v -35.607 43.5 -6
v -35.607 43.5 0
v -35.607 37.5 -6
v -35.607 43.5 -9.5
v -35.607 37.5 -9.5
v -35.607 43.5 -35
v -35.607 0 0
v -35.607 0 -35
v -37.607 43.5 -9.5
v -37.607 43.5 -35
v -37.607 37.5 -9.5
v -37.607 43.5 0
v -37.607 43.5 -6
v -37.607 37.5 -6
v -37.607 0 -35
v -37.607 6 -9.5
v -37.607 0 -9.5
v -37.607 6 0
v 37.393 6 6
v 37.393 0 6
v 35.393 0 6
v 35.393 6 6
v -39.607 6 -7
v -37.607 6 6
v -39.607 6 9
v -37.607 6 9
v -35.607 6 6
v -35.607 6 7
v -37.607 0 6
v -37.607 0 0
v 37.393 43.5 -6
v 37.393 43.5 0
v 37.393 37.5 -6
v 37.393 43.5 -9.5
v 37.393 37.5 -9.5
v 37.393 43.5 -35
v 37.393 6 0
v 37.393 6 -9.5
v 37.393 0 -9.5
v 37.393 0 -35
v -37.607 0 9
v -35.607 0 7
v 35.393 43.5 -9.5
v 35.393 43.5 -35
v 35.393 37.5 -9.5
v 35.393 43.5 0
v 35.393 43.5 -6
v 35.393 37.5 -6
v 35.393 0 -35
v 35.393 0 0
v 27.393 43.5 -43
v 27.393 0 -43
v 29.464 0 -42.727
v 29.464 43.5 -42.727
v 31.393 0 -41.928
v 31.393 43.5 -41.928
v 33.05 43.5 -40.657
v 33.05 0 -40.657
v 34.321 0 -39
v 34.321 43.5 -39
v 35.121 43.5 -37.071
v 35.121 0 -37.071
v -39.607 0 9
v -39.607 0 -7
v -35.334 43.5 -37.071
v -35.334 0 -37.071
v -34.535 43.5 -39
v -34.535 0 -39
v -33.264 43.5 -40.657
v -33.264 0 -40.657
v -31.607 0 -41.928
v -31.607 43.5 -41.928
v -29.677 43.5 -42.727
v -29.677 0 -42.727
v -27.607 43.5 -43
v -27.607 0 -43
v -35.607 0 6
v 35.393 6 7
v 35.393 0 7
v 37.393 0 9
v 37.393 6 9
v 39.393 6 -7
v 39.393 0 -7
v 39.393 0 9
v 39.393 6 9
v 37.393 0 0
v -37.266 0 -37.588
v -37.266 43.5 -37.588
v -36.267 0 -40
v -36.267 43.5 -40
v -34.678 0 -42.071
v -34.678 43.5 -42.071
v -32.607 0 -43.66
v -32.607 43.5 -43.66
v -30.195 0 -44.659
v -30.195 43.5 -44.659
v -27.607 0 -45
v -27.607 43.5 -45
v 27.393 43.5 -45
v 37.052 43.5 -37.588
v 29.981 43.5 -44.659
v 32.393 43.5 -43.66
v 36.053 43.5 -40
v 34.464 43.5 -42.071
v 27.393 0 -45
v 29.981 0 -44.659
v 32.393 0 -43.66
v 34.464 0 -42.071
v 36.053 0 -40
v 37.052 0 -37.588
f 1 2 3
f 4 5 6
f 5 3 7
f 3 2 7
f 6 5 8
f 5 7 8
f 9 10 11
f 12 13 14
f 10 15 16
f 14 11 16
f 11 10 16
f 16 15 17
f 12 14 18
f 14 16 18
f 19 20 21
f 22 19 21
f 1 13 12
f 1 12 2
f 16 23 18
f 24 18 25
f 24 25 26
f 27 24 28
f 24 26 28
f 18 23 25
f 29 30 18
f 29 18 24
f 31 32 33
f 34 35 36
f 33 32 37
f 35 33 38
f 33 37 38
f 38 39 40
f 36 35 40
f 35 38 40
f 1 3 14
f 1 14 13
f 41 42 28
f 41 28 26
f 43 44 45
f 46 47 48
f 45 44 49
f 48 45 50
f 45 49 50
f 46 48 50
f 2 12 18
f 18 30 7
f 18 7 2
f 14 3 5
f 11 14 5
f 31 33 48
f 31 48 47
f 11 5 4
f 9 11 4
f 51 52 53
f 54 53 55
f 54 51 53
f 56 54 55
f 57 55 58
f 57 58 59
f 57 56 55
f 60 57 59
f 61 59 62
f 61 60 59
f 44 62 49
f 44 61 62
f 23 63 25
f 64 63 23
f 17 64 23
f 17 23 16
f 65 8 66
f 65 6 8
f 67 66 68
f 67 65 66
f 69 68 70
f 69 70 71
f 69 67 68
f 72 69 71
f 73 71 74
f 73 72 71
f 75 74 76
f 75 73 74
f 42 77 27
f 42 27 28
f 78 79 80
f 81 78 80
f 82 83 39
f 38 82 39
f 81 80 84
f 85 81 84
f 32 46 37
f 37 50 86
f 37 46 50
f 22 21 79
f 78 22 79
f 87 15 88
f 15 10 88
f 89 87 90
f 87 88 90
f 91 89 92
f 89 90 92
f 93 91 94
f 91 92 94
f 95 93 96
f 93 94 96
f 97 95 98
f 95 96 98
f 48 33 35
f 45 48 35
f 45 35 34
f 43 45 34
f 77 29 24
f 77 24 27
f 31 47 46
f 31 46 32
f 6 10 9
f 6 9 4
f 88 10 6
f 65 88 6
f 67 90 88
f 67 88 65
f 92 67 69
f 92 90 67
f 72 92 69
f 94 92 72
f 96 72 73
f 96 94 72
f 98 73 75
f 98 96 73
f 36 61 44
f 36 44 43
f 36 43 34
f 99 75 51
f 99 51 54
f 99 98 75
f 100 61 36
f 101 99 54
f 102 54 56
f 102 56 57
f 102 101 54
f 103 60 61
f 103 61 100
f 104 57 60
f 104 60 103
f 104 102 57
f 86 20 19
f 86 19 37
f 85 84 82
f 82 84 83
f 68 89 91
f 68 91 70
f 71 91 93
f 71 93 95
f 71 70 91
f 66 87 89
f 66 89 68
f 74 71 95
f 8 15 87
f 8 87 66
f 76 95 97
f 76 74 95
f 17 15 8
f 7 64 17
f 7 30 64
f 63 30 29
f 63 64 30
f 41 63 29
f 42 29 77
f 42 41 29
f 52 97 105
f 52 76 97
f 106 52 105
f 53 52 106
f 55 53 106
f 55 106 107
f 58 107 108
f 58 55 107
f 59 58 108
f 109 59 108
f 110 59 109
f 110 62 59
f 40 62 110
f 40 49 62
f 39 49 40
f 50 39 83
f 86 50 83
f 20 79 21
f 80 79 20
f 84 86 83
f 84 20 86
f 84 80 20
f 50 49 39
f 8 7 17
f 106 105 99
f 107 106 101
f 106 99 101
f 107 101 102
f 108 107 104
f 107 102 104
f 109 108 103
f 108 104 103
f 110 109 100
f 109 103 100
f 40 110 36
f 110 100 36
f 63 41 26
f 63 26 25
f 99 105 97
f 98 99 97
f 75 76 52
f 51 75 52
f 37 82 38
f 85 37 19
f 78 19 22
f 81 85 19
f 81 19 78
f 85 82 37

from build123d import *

# Parameters (mm, degrees)
BOSS_EXTRUDE1_DEPTH = 43.5
FILLET1_R           = 8
FILLET2_R           = 10
SKETCH3_W           = 3.5
SKETCH3_H           = 6
CUT_EXTRUDE1_DEPTH  = 57.75
BOSS_EXTRUDE2_DEPTH = 6


with BuildPart() as part:
    # Sketch2 → Boss-Extrude1 (new body)
    with BuildSketch(Plane(origin=(0, 0, 0), x_dir=(1, 0, 0), z_dir=(0, 1, 0))):
        Polygon((35.39315693, 0), (37.39315693, 0), (37.39315693, 45), (-37.60684307, 45), (-37.60684307, 0), (-35.60684307, 0), (-35.60684307, 43), (35.39315693, 43), align=None)
    extrude(amount=BOSS_EXTRUDE1_DEPTH)

    # Fillet1
    fillet1_edges = [part.edges().sort_by_distance(p)[0] for p in [
        (35.39315693, 21.75, -43),
        (-35.60684307, 21.75, -43),
    ]]
    fillet(fillet1_edges, radius=FILLET1_R)

    # Fillet2
    fillet2_edges = [part.edges().sort_by_distance(p)[0] for p in [
        (-37.60684307, 21.75, -45),
        (37.39315693, 21.75, -45),
    ]]
    fillet(fillet2_edges, radius=FILLET2_R)

    # Sketch3 → Cut-Extrude1 (cut, symmetric)
    with BuildSketch(Plane(origin=(0, 0, 0), x_dir=(0, 0, -1), z_dir=(1, 0, 0))):
        with Locations((7.75, 40.5)):
            Rectangle(SKETCH3_W, SKETCH3_H)
    extrude(amount=CUT_EXTRUDE1_DEPTH, both=True, mode=Mode.SUBTRACT)

    # Sketch4 → Boss-Extrude2 (add)
    with BuildSketch(Plane.XZ):
        Polygon((-37.60684307, -7), (-37.60684307, 6), (-35.60684307, 6), (-35.60684307, 7), (-37.60684307, 9), (-39.60684307, 9), (-39.60684307, -7), (-37.60684307, -9.5), align=None)
        Polygon((37.39315693, -7), (37.39315693, 6), (35.39315693, 6), (35.39315693, 7), (37.39315693, 9), (39.39315693, 9), (39.39315693, -7), (37.39315693, -9.5), align=None)
    extrude(amount=-BOSS_EXTRUDE2_DEPTH)


solid = part.part
